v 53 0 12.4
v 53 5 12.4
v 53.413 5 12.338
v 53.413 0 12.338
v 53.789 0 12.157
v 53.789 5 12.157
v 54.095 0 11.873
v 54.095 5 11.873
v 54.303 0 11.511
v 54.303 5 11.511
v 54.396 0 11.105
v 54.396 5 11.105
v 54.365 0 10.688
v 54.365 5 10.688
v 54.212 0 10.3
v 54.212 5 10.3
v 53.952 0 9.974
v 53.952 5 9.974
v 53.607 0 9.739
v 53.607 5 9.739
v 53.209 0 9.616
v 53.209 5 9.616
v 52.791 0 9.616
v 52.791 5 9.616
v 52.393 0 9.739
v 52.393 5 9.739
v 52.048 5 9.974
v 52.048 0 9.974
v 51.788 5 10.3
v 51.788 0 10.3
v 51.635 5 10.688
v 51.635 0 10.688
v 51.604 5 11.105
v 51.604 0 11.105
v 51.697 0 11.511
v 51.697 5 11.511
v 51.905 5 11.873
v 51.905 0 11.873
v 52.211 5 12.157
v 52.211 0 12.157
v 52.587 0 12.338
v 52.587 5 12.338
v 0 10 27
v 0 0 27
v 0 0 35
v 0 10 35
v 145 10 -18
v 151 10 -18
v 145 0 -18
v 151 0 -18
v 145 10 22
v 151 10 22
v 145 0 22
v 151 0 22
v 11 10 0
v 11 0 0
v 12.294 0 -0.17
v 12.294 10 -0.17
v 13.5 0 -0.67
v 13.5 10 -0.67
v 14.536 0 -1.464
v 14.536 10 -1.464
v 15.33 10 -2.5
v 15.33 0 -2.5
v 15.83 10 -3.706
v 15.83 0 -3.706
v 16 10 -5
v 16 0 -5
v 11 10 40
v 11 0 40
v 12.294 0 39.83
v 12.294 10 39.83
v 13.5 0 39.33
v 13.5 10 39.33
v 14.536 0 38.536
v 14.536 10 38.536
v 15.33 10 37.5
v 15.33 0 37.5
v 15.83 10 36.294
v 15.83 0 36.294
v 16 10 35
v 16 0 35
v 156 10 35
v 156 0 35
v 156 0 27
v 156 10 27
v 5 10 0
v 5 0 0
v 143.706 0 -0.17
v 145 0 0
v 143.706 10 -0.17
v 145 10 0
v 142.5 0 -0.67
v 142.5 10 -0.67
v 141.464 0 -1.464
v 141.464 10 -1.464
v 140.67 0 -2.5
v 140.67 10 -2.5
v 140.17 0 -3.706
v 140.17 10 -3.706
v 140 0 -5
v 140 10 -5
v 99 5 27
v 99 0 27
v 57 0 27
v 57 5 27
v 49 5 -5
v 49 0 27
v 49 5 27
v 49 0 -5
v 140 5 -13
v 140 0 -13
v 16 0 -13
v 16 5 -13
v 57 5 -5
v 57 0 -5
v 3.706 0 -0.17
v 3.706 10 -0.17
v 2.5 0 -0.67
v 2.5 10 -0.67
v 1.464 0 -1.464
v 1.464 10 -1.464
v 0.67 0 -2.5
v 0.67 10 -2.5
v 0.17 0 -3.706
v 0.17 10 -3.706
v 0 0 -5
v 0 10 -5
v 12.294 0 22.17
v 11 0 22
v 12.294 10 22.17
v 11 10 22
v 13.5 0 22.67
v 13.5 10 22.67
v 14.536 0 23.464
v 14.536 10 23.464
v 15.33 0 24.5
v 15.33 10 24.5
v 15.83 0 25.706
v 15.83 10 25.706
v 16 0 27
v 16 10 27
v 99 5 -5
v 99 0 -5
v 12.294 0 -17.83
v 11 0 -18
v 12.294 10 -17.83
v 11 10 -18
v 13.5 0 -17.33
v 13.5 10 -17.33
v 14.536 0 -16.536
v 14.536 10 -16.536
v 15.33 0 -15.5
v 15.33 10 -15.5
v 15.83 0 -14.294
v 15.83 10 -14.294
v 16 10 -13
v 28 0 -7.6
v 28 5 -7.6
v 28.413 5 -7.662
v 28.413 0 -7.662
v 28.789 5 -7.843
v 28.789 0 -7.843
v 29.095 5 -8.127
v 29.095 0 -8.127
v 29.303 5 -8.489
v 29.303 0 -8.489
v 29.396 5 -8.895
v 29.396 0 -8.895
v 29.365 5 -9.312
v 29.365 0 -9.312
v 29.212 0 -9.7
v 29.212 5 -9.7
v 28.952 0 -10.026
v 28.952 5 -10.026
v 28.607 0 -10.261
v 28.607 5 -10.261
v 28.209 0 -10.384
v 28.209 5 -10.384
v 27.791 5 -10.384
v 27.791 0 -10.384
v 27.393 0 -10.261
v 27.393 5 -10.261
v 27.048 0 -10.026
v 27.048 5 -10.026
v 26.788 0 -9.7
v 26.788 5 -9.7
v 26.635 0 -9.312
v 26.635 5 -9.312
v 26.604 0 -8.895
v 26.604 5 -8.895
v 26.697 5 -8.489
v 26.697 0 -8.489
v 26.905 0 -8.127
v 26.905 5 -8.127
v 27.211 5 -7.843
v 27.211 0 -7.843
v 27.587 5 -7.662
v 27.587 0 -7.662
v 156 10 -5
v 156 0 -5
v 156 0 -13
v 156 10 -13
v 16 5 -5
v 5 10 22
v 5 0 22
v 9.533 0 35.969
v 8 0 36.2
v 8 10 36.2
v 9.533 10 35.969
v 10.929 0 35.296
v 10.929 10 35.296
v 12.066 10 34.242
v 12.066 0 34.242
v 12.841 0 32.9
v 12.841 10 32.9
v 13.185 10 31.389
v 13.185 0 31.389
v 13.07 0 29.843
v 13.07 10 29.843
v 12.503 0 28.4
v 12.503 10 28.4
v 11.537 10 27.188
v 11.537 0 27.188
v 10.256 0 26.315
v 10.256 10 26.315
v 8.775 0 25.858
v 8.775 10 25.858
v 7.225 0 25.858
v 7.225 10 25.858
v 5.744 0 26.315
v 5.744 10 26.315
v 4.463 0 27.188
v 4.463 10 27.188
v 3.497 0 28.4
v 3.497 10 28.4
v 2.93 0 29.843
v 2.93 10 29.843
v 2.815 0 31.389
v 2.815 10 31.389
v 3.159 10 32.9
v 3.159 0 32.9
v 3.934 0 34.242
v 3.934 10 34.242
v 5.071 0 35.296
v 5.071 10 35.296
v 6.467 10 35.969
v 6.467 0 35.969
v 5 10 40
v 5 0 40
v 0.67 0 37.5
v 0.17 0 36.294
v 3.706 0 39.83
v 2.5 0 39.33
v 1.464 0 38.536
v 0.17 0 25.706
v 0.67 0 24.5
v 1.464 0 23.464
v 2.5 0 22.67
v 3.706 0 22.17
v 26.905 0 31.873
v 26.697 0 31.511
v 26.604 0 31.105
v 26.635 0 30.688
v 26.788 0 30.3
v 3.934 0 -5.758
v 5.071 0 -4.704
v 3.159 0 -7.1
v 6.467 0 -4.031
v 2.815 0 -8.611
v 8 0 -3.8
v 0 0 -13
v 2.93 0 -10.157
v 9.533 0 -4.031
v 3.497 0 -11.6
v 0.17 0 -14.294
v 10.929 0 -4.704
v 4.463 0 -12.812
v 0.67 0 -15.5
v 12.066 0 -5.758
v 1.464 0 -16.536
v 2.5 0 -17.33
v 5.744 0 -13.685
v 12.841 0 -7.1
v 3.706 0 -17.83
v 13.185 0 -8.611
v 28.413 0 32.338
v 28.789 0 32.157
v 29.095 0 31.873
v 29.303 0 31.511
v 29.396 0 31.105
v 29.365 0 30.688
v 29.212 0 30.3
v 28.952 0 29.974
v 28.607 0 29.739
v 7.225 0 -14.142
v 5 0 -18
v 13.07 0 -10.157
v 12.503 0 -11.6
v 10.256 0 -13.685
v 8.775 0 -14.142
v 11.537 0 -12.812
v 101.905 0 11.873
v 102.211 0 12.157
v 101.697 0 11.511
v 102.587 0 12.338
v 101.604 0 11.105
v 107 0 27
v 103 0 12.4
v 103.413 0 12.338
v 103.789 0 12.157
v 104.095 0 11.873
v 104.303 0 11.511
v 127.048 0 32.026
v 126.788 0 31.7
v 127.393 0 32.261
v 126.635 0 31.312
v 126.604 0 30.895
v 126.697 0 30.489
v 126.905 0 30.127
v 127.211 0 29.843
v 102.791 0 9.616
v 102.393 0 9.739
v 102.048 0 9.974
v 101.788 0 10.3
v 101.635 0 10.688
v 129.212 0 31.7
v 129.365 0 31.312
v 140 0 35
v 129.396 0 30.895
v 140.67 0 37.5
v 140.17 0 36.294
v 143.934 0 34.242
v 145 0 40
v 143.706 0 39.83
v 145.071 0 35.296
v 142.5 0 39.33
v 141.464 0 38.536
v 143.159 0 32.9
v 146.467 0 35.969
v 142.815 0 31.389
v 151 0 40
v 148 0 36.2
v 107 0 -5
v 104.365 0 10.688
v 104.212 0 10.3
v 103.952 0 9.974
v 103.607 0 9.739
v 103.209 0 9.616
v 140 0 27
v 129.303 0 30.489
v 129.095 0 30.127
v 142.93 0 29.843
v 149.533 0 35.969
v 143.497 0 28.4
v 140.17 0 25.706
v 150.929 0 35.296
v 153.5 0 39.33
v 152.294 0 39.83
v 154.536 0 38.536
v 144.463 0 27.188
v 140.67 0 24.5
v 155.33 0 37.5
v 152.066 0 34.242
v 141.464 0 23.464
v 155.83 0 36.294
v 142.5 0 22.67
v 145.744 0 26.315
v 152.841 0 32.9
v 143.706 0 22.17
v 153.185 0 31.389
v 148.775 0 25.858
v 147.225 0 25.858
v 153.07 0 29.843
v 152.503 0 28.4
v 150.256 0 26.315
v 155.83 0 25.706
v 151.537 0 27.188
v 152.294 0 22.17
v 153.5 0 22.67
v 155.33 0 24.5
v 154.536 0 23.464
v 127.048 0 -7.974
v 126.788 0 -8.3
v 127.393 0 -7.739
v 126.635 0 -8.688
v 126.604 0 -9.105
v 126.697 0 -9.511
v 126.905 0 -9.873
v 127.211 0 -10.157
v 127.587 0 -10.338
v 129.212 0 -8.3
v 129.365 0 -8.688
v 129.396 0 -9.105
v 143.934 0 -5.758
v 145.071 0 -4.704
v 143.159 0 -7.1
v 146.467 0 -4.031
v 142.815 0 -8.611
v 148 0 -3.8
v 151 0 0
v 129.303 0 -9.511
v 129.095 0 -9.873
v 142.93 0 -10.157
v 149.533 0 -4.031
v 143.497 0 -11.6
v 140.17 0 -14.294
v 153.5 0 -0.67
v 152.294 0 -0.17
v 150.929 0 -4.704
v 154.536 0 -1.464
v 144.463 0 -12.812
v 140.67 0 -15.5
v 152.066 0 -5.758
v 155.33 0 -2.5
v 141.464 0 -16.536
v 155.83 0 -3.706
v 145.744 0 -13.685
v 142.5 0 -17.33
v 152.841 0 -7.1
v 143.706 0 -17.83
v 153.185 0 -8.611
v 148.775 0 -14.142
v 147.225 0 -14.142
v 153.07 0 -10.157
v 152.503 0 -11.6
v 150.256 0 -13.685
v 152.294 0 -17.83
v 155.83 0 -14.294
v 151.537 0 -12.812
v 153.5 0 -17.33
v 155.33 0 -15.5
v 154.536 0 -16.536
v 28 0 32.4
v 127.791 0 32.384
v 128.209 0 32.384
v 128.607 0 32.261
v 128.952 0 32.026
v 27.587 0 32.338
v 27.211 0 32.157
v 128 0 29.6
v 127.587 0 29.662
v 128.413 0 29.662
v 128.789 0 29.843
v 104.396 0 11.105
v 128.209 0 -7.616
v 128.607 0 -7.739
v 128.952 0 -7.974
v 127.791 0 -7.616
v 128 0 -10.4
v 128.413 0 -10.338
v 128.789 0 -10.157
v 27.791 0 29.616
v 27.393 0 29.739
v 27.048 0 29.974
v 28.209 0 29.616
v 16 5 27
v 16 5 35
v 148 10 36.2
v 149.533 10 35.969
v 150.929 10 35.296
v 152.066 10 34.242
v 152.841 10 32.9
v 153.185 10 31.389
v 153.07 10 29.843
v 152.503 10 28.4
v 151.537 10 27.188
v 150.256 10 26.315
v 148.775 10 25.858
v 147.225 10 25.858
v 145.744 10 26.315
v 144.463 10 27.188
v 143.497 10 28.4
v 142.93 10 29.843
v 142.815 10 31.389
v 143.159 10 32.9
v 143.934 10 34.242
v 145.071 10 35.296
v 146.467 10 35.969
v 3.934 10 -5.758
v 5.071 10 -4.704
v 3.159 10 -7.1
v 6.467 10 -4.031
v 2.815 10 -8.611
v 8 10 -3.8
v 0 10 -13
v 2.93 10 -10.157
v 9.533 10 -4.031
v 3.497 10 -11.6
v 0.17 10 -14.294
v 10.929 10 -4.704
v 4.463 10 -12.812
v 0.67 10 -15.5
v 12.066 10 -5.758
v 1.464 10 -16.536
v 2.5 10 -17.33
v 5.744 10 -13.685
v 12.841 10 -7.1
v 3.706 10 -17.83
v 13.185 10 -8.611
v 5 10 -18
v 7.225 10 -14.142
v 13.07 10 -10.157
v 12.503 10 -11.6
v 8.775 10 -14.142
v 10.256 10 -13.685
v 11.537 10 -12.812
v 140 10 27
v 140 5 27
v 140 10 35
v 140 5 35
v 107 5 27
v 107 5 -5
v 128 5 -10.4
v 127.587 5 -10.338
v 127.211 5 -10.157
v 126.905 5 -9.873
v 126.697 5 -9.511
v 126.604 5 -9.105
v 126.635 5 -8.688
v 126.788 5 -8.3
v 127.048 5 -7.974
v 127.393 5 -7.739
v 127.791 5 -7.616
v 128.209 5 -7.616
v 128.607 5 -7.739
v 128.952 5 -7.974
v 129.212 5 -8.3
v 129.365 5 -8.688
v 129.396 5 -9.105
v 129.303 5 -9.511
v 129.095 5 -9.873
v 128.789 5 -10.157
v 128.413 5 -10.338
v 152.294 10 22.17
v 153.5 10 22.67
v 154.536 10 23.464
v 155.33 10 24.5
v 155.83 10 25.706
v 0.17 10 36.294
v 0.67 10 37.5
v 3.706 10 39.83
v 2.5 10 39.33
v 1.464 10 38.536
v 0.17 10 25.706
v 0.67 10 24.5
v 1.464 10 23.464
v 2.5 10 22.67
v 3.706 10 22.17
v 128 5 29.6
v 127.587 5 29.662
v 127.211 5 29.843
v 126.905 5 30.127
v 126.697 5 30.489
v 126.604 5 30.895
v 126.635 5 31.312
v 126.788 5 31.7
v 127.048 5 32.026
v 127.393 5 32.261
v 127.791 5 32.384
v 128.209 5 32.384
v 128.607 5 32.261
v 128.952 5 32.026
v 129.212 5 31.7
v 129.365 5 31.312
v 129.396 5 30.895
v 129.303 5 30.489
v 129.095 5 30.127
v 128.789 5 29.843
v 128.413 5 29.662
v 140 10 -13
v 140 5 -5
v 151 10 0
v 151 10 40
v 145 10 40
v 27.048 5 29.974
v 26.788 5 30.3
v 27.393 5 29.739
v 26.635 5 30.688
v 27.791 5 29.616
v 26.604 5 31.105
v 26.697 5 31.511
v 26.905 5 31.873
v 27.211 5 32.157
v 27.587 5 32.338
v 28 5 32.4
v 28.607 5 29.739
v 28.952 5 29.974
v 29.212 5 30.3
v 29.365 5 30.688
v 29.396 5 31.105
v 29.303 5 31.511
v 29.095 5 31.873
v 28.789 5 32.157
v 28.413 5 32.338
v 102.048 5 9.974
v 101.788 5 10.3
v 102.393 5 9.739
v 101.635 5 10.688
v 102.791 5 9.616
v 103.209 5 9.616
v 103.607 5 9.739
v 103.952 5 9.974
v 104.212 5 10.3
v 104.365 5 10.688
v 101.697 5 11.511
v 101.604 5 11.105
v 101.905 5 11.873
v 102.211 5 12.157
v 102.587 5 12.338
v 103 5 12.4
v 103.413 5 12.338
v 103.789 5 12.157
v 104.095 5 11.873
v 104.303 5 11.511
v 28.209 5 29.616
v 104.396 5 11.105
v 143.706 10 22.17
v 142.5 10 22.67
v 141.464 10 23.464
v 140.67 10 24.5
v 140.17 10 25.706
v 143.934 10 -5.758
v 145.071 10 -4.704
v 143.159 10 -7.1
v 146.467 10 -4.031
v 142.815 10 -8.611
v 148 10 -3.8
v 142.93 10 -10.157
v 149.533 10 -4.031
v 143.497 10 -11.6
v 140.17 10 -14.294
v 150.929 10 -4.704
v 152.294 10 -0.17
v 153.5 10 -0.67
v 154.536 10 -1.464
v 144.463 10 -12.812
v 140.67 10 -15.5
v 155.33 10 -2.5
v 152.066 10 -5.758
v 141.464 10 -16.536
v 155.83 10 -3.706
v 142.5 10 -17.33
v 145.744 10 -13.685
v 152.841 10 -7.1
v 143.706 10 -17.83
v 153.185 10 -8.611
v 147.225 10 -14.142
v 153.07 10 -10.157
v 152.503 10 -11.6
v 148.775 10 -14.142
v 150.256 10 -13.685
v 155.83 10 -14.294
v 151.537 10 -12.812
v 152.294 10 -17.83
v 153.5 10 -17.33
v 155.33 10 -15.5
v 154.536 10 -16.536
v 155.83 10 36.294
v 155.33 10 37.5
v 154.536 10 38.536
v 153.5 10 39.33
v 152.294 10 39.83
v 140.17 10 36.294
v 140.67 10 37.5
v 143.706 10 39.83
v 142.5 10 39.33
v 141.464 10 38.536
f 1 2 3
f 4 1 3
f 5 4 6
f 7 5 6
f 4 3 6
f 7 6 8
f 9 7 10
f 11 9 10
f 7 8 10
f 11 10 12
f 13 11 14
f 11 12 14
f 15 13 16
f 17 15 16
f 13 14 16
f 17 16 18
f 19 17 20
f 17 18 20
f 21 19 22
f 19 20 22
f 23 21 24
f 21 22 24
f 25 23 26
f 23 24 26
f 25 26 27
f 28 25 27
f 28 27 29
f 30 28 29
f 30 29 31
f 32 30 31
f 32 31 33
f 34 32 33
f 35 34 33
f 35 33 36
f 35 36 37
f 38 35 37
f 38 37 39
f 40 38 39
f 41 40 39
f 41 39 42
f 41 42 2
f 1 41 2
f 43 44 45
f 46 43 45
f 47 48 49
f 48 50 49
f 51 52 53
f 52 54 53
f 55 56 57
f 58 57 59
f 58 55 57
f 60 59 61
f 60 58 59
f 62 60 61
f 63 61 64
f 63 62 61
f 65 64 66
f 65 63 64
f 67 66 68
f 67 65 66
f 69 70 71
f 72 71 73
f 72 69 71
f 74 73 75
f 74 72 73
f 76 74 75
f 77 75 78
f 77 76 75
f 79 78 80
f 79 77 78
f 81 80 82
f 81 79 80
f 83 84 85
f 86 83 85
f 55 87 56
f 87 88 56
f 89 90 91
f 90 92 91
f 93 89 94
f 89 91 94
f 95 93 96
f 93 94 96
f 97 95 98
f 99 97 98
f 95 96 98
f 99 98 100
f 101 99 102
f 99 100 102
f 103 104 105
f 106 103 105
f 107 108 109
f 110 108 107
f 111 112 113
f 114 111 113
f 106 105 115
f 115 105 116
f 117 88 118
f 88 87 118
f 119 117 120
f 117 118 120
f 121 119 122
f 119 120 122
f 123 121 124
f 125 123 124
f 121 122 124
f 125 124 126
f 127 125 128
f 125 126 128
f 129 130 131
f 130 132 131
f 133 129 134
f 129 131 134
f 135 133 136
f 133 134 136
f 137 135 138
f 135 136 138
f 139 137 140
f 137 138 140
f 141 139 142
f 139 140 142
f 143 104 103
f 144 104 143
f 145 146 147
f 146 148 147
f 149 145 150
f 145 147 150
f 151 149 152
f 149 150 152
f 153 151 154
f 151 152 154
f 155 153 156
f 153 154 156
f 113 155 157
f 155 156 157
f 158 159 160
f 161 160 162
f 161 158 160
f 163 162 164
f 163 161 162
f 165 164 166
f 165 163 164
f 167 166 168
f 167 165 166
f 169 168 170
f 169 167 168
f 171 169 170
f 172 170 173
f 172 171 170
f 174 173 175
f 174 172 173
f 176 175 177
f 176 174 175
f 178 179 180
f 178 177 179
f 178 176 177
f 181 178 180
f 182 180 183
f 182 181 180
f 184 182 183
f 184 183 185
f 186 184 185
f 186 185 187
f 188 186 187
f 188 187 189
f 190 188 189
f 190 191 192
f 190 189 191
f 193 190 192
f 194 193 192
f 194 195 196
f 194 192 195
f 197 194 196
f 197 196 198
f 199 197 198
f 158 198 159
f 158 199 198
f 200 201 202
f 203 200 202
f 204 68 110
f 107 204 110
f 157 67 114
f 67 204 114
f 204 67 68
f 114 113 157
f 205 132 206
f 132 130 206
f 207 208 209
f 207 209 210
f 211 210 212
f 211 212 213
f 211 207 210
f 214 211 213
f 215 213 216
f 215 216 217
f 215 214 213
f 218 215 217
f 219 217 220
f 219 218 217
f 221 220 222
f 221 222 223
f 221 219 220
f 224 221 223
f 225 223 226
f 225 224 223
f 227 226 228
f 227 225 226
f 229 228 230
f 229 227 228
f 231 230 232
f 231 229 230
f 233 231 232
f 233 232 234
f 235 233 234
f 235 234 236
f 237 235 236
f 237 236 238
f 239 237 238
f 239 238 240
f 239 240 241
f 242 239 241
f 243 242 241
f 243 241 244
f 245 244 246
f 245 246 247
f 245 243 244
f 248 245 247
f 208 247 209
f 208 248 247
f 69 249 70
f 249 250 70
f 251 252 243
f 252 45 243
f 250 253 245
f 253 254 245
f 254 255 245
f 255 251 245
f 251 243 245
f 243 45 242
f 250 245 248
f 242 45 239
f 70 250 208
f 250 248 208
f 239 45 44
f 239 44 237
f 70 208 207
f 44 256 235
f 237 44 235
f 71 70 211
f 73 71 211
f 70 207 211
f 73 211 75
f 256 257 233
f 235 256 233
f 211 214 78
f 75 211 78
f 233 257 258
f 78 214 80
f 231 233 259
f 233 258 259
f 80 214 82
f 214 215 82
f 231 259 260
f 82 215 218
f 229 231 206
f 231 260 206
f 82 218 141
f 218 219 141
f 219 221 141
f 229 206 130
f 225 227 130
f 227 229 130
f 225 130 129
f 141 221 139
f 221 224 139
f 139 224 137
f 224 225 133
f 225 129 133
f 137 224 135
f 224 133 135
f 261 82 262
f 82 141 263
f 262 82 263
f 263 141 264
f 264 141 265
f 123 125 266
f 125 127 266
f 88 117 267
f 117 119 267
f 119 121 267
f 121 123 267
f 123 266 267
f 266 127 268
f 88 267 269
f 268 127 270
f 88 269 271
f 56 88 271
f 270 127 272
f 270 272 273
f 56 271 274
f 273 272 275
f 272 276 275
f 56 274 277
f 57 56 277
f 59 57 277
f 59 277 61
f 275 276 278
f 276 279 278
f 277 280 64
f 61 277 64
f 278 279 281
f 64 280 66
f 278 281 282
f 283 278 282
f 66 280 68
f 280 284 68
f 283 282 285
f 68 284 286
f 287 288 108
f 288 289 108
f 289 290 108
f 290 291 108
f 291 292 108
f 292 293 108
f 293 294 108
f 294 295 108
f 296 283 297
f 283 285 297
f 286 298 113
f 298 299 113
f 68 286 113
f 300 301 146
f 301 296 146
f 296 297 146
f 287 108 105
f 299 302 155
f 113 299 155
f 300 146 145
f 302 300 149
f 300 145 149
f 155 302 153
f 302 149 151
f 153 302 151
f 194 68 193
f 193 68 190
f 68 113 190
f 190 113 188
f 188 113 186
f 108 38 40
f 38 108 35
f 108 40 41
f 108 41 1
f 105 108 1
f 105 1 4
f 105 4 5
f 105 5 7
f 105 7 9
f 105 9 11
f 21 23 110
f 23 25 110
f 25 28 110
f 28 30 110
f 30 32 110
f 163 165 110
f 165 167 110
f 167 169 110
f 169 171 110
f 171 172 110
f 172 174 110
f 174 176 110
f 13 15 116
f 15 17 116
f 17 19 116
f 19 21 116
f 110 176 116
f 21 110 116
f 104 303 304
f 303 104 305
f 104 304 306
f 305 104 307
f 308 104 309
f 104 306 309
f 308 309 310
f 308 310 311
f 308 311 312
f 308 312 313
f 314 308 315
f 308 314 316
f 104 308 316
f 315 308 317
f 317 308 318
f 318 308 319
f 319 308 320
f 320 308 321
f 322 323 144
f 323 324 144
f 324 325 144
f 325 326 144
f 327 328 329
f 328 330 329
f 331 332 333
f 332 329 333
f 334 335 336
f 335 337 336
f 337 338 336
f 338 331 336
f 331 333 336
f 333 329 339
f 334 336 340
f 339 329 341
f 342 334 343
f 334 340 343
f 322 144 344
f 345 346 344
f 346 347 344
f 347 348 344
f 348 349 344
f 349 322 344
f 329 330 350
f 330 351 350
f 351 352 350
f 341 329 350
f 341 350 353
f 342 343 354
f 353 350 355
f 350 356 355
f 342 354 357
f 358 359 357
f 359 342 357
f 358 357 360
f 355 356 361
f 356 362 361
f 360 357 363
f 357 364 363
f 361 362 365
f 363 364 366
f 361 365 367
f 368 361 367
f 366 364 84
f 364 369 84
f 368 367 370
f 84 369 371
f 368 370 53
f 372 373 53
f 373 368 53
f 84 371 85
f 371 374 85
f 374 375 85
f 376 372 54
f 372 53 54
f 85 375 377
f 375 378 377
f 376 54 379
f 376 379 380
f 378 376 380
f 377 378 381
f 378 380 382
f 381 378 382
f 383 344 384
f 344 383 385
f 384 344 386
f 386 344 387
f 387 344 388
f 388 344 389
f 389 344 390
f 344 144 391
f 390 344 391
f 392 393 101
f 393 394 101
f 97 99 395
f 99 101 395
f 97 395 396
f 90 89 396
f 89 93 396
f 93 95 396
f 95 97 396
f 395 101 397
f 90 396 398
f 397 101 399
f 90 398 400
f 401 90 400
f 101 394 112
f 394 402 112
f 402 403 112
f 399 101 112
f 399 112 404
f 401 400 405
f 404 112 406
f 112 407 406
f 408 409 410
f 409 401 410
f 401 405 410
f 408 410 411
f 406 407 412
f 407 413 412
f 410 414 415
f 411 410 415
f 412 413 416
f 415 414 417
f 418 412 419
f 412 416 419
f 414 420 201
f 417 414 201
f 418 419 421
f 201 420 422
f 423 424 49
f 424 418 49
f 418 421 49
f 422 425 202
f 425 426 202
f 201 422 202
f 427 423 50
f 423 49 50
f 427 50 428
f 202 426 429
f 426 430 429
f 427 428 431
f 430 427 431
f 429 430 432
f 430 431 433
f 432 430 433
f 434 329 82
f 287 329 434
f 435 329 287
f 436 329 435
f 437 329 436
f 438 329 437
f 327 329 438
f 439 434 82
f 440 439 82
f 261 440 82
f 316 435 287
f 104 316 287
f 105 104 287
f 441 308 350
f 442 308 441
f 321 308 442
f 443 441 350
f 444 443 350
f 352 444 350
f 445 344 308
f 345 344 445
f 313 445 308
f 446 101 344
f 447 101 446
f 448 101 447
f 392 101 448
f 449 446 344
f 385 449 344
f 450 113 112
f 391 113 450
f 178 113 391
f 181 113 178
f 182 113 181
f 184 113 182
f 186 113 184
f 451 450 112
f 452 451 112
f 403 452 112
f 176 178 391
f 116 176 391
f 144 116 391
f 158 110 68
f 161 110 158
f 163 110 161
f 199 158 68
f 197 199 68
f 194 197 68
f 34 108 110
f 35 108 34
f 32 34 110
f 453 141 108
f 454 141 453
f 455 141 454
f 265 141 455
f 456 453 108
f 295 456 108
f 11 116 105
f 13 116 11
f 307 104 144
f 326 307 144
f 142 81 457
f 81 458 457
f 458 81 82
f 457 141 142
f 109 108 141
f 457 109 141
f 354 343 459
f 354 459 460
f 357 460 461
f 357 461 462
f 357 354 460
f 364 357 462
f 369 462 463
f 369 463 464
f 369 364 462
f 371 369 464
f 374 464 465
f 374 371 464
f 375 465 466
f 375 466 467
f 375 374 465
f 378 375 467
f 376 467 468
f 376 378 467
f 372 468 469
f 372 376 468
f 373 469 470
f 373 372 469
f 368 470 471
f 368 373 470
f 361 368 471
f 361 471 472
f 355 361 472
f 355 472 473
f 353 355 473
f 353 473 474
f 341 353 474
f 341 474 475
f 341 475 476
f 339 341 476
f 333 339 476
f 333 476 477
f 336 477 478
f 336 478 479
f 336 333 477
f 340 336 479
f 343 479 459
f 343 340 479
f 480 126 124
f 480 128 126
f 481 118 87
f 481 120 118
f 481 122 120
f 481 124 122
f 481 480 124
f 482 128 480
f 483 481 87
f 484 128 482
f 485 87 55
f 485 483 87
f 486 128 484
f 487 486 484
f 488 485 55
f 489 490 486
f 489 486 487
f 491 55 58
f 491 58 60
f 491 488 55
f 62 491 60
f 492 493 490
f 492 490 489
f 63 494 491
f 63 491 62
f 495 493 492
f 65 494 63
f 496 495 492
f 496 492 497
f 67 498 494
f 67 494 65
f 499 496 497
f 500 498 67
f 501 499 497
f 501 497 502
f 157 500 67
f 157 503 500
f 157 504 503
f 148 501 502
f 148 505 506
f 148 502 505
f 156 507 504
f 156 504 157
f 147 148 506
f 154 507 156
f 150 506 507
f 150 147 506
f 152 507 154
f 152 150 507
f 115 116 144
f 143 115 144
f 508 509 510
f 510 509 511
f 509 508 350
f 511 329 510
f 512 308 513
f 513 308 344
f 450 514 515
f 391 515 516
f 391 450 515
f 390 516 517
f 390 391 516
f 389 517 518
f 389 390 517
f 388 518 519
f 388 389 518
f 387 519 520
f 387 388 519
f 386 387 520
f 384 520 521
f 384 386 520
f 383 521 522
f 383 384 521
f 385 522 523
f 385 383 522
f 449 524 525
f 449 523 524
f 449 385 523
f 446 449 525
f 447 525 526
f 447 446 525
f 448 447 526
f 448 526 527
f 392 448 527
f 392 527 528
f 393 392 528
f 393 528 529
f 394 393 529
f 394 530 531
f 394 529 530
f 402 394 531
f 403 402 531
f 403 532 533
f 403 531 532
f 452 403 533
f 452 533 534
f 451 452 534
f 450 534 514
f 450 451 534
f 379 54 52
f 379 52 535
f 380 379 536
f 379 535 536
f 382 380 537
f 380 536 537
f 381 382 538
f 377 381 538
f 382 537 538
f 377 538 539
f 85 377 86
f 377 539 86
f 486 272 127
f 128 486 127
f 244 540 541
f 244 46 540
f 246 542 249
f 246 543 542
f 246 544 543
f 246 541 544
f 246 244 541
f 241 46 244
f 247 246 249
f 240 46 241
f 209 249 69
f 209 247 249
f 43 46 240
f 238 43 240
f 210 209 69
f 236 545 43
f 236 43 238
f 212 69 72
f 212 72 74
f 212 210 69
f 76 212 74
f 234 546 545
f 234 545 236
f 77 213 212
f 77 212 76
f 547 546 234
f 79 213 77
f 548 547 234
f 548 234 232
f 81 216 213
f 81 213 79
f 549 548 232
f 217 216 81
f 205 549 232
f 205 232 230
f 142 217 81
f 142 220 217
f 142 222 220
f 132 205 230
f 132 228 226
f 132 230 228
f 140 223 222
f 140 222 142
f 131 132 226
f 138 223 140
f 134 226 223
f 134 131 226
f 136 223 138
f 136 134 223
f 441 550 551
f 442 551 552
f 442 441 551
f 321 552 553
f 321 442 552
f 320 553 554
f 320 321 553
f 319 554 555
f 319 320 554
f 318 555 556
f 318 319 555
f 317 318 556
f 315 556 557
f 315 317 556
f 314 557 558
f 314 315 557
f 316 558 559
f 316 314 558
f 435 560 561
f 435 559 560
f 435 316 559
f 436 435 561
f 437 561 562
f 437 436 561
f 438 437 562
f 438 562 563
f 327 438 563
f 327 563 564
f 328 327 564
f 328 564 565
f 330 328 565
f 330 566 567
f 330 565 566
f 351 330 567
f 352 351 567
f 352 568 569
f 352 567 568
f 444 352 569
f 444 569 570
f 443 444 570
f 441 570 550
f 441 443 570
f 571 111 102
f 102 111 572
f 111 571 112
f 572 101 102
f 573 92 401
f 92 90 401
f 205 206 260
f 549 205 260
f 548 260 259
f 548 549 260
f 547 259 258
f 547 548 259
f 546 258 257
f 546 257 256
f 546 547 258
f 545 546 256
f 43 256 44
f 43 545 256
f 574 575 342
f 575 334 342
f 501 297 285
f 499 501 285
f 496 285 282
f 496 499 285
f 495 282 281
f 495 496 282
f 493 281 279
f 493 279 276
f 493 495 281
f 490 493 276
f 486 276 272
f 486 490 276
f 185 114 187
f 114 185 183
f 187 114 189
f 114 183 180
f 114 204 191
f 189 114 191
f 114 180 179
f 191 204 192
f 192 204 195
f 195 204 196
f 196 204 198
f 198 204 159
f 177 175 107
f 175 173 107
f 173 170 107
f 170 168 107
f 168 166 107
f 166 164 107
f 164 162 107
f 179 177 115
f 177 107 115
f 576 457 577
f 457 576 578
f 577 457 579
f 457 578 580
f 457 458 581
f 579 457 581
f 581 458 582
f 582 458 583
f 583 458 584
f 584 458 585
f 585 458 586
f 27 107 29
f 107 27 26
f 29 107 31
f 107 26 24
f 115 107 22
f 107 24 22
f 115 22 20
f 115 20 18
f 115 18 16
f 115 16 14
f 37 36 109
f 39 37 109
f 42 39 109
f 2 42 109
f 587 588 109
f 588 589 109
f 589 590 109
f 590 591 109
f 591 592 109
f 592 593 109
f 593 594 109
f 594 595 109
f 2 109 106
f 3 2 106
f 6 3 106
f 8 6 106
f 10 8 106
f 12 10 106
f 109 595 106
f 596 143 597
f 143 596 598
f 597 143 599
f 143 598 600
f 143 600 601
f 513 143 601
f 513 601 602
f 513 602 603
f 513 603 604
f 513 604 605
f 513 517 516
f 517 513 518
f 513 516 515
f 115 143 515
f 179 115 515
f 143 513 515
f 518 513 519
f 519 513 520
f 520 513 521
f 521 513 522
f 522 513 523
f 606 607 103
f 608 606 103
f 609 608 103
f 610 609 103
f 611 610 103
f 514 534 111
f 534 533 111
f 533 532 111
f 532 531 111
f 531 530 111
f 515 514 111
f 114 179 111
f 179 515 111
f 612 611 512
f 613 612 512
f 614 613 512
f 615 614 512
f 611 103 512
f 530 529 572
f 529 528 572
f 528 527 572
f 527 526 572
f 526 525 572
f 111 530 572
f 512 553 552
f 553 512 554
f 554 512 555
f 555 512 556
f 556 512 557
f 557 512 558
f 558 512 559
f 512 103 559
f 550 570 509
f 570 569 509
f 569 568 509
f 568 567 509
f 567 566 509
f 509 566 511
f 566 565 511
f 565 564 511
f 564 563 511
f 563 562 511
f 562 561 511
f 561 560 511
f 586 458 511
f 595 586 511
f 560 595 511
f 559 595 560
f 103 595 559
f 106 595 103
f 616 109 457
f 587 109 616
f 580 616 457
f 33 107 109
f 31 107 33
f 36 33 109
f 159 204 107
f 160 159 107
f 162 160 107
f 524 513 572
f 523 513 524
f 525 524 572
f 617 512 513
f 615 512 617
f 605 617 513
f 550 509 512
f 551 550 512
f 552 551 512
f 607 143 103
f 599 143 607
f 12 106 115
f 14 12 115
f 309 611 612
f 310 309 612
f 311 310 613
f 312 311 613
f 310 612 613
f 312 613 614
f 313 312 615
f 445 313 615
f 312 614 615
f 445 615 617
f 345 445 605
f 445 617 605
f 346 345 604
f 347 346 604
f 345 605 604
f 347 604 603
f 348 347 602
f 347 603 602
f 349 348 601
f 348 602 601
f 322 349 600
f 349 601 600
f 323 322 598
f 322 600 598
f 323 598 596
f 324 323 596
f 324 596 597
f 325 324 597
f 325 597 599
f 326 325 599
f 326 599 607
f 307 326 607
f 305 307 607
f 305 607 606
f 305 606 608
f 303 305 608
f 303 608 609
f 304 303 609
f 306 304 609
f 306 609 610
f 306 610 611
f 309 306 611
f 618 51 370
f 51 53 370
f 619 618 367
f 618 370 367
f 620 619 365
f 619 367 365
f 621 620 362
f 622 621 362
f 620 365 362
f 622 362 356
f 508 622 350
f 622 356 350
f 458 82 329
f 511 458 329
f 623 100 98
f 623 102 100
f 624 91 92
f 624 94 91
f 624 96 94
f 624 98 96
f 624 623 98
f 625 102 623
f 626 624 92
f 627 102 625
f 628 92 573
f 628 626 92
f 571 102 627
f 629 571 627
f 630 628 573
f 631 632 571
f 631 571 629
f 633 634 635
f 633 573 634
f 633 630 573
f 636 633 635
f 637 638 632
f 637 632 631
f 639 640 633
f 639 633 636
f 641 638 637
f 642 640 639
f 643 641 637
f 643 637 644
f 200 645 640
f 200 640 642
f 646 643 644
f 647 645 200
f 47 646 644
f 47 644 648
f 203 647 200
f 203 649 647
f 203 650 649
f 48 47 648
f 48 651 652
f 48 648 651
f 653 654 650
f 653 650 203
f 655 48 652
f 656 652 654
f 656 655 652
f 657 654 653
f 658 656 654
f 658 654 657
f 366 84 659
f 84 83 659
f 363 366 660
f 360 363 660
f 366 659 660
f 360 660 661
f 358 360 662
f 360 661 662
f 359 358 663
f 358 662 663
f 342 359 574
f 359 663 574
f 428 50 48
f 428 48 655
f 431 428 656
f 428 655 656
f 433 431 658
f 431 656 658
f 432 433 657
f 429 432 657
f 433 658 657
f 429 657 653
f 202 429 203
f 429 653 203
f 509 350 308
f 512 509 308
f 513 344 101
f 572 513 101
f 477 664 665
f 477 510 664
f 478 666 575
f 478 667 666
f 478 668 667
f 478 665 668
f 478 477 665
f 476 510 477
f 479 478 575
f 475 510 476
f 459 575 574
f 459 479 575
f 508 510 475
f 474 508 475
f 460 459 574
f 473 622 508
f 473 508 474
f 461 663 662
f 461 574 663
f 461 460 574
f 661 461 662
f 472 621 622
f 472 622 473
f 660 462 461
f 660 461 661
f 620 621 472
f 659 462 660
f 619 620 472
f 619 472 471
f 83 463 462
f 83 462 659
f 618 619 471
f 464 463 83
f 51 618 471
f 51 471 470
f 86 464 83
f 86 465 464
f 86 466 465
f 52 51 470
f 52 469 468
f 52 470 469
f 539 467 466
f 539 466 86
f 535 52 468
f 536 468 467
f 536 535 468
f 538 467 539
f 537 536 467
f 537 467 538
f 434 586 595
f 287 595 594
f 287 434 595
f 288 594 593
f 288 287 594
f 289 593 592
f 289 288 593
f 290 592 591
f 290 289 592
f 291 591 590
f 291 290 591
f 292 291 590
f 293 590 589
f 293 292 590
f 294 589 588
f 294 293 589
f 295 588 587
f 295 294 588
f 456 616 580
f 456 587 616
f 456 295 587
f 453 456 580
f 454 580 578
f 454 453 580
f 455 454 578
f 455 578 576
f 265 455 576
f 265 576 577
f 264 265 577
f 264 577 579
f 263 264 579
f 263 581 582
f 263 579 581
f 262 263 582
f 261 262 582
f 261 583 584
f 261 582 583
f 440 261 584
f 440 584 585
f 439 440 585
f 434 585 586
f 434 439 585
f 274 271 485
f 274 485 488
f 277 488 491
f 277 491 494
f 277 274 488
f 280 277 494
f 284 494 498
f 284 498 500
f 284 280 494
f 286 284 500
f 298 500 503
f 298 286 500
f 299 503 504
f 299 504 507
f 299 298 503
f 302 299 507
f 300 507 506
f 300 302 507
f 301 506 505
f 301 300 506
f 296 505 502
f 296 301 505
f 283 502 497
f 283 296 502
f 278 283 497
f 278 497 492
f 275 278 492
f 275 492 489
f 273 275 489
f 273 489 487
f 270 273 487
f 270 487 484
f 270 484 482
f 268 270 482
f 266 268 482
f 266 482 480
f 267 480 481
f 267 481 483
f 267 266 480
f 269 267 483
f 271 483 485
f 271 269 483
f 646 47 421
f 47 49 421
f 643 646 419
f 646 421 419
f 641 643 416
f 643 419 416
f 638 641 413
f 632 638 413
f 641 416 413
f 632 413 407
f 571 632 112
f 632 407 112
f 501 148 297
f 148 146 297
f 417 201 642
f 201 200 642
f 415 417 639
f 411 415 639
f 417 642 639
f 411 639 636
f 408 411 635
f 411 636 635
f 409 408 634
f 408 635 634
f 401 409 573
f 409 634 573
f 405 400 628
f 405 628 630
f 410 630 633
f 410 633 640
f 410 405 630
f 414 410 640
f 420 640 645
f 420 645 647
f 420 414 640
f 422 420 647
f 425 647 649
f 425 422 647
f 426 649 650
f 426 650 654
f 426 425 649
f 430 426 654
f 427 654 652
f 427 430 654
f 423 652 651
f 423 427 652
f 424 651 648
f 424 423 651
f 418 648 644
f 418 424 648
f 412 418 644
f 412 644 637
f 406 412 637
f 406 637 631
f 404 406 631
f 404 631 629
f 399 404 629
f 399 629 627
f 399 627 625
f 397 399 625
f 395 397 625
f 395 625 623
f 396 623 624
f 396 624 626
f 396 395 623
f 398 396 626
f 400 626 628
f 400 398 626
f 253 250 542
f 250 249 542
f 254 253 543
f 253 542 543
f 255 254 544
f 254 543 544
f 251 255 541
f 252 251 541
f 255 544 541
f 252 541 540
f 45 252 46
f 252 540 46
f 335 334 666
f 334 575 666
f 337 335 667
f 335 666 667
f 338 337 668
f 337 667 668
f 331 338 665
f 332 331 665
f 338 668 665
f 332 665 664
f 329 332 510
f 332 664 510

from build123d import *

# Parameters (mm, degrees)
SKETCH1_R           = 5.2
SKETCH1_R_2         = 1.4
BOSS_EXTRUDE1_DEPTH = 10
SKETCH2_W           = 124
SKETCH2_H           = 5
CUT_EXTRUDE1_DEPTH  = 158.353106102
FILLET1_R           = 5
SKETCH3_W           = 8
SKETCH3_H           = 32
BOSS_EXTRUDE2_DEPTH = 5
SKETCH4_R           = 1.4
CUT_EXTRUDE2_DEPTH  = 162.124175716


with BuildPart() as part:
    # Sketch1 → Boss-Extrude1 (new body)
    with BuildSketch(Plane(origin=(0, 0, 0), x_dir=(1, 0, 0), z_dir=(0, 1, 0))):
        Polygon((0, 0), (16, 0), (16, 5), (140, 5), (140, 0), (156, 0), (156, 18), (140, 18), (140, 13), (16, 13), (16, 18), (0, 18), align=None)
        with Locations(Location((8, 9, 0), (0, 0, 270))):
            Circle(SKETCH1_R, mode=Mode.SUBTRACT)
        with Locations(Location((148, 9, 0), (0, 0, 270))):
            Circle(SKETCH1_R, mode=Mode.SUBTRACT)
        with Locations(Location((28, 9, 0), (0, 0, 270))):
            Circle(SKETCH1_R_2, mode=Mode.SUBTRACT)
        with Locations(Location((128, 9, 0), (0, 0, 90))):
            Circle(SKETCH1_R_2, mode=Mode.SUBTRACT)
    extrude(amount=BOSS_EXTRUDE1_DEPTH)

    # Sketch2 → Cut-Extrude1 (cut, through all)
    with BuildSketch(Plane.XY):
        with Locations((78, 7.5)):
            Rectangle(SKETCH2_W, SKETCH2_H)
    extrude(amount=-CUT_EXTRUDE1_DEPTH, mode=Mode.SUBTRACT)

    # Fillet1
    fillet1_edges = [part.edges().sort_by_distance(p)[0] for p in [
        (140, 5, 0),
        (156, 5, 0),
        (156, 5, -18),
        (140, 5, -18),
        (0, 5, 0),
        (0, 5, -18),
        (16, 5, -18),
        (16, 5, 0),
    ]]
    fillet(fillet1_edges, radius=FILLET1_R - 0.0001)  # a hair under: the kernel refuses the full size


with BuildPart() as body_2:
    # Body-Move/Copy1: copy of part
    add(part.part.moved(Location((0, 0, 40))))


with BuildPart() as part_1:
    add(part.part)

    add(body_2.part)  # Boss-Extrude2 merges body 2
    # Sketch3 → Boss-Extrude2 (add)
    with BuildSketch(Plane(origin=(0, 0, 0), x_dir=(1, 0, 0), z_dir=(0, 1, 0))):
        with Locations((53, -11)):
            Rectangle(SKETCH3_W, SKETCH3_H)
        with Locations((103, -11)):
            Rectangle(SKETCH3_W, SKETCH3_H)
    extrude(amount=BOSS_EXTRUDE2_DEPTH)

    # Sketch4 → Cut-Extrude2 (cut, through all)
    with BuildSketch(Plane(origin=(0, 5, 0), x_dir=(1, 0, 0), z_dir=(0, 1, 0))):
        with Locations(Location((53, -11, 0), (0, 0, 270))):
            Circle(SKETCH4_R)
        with Locations(Location((103, -11, 0), (0, 0, 270))):
            Circle(SKETCH4_R)
    extrude(amount=-CUT_EXTRUDE2_DEPTH, mode=Mode.SUBTRACT)


solid = part_1.part
